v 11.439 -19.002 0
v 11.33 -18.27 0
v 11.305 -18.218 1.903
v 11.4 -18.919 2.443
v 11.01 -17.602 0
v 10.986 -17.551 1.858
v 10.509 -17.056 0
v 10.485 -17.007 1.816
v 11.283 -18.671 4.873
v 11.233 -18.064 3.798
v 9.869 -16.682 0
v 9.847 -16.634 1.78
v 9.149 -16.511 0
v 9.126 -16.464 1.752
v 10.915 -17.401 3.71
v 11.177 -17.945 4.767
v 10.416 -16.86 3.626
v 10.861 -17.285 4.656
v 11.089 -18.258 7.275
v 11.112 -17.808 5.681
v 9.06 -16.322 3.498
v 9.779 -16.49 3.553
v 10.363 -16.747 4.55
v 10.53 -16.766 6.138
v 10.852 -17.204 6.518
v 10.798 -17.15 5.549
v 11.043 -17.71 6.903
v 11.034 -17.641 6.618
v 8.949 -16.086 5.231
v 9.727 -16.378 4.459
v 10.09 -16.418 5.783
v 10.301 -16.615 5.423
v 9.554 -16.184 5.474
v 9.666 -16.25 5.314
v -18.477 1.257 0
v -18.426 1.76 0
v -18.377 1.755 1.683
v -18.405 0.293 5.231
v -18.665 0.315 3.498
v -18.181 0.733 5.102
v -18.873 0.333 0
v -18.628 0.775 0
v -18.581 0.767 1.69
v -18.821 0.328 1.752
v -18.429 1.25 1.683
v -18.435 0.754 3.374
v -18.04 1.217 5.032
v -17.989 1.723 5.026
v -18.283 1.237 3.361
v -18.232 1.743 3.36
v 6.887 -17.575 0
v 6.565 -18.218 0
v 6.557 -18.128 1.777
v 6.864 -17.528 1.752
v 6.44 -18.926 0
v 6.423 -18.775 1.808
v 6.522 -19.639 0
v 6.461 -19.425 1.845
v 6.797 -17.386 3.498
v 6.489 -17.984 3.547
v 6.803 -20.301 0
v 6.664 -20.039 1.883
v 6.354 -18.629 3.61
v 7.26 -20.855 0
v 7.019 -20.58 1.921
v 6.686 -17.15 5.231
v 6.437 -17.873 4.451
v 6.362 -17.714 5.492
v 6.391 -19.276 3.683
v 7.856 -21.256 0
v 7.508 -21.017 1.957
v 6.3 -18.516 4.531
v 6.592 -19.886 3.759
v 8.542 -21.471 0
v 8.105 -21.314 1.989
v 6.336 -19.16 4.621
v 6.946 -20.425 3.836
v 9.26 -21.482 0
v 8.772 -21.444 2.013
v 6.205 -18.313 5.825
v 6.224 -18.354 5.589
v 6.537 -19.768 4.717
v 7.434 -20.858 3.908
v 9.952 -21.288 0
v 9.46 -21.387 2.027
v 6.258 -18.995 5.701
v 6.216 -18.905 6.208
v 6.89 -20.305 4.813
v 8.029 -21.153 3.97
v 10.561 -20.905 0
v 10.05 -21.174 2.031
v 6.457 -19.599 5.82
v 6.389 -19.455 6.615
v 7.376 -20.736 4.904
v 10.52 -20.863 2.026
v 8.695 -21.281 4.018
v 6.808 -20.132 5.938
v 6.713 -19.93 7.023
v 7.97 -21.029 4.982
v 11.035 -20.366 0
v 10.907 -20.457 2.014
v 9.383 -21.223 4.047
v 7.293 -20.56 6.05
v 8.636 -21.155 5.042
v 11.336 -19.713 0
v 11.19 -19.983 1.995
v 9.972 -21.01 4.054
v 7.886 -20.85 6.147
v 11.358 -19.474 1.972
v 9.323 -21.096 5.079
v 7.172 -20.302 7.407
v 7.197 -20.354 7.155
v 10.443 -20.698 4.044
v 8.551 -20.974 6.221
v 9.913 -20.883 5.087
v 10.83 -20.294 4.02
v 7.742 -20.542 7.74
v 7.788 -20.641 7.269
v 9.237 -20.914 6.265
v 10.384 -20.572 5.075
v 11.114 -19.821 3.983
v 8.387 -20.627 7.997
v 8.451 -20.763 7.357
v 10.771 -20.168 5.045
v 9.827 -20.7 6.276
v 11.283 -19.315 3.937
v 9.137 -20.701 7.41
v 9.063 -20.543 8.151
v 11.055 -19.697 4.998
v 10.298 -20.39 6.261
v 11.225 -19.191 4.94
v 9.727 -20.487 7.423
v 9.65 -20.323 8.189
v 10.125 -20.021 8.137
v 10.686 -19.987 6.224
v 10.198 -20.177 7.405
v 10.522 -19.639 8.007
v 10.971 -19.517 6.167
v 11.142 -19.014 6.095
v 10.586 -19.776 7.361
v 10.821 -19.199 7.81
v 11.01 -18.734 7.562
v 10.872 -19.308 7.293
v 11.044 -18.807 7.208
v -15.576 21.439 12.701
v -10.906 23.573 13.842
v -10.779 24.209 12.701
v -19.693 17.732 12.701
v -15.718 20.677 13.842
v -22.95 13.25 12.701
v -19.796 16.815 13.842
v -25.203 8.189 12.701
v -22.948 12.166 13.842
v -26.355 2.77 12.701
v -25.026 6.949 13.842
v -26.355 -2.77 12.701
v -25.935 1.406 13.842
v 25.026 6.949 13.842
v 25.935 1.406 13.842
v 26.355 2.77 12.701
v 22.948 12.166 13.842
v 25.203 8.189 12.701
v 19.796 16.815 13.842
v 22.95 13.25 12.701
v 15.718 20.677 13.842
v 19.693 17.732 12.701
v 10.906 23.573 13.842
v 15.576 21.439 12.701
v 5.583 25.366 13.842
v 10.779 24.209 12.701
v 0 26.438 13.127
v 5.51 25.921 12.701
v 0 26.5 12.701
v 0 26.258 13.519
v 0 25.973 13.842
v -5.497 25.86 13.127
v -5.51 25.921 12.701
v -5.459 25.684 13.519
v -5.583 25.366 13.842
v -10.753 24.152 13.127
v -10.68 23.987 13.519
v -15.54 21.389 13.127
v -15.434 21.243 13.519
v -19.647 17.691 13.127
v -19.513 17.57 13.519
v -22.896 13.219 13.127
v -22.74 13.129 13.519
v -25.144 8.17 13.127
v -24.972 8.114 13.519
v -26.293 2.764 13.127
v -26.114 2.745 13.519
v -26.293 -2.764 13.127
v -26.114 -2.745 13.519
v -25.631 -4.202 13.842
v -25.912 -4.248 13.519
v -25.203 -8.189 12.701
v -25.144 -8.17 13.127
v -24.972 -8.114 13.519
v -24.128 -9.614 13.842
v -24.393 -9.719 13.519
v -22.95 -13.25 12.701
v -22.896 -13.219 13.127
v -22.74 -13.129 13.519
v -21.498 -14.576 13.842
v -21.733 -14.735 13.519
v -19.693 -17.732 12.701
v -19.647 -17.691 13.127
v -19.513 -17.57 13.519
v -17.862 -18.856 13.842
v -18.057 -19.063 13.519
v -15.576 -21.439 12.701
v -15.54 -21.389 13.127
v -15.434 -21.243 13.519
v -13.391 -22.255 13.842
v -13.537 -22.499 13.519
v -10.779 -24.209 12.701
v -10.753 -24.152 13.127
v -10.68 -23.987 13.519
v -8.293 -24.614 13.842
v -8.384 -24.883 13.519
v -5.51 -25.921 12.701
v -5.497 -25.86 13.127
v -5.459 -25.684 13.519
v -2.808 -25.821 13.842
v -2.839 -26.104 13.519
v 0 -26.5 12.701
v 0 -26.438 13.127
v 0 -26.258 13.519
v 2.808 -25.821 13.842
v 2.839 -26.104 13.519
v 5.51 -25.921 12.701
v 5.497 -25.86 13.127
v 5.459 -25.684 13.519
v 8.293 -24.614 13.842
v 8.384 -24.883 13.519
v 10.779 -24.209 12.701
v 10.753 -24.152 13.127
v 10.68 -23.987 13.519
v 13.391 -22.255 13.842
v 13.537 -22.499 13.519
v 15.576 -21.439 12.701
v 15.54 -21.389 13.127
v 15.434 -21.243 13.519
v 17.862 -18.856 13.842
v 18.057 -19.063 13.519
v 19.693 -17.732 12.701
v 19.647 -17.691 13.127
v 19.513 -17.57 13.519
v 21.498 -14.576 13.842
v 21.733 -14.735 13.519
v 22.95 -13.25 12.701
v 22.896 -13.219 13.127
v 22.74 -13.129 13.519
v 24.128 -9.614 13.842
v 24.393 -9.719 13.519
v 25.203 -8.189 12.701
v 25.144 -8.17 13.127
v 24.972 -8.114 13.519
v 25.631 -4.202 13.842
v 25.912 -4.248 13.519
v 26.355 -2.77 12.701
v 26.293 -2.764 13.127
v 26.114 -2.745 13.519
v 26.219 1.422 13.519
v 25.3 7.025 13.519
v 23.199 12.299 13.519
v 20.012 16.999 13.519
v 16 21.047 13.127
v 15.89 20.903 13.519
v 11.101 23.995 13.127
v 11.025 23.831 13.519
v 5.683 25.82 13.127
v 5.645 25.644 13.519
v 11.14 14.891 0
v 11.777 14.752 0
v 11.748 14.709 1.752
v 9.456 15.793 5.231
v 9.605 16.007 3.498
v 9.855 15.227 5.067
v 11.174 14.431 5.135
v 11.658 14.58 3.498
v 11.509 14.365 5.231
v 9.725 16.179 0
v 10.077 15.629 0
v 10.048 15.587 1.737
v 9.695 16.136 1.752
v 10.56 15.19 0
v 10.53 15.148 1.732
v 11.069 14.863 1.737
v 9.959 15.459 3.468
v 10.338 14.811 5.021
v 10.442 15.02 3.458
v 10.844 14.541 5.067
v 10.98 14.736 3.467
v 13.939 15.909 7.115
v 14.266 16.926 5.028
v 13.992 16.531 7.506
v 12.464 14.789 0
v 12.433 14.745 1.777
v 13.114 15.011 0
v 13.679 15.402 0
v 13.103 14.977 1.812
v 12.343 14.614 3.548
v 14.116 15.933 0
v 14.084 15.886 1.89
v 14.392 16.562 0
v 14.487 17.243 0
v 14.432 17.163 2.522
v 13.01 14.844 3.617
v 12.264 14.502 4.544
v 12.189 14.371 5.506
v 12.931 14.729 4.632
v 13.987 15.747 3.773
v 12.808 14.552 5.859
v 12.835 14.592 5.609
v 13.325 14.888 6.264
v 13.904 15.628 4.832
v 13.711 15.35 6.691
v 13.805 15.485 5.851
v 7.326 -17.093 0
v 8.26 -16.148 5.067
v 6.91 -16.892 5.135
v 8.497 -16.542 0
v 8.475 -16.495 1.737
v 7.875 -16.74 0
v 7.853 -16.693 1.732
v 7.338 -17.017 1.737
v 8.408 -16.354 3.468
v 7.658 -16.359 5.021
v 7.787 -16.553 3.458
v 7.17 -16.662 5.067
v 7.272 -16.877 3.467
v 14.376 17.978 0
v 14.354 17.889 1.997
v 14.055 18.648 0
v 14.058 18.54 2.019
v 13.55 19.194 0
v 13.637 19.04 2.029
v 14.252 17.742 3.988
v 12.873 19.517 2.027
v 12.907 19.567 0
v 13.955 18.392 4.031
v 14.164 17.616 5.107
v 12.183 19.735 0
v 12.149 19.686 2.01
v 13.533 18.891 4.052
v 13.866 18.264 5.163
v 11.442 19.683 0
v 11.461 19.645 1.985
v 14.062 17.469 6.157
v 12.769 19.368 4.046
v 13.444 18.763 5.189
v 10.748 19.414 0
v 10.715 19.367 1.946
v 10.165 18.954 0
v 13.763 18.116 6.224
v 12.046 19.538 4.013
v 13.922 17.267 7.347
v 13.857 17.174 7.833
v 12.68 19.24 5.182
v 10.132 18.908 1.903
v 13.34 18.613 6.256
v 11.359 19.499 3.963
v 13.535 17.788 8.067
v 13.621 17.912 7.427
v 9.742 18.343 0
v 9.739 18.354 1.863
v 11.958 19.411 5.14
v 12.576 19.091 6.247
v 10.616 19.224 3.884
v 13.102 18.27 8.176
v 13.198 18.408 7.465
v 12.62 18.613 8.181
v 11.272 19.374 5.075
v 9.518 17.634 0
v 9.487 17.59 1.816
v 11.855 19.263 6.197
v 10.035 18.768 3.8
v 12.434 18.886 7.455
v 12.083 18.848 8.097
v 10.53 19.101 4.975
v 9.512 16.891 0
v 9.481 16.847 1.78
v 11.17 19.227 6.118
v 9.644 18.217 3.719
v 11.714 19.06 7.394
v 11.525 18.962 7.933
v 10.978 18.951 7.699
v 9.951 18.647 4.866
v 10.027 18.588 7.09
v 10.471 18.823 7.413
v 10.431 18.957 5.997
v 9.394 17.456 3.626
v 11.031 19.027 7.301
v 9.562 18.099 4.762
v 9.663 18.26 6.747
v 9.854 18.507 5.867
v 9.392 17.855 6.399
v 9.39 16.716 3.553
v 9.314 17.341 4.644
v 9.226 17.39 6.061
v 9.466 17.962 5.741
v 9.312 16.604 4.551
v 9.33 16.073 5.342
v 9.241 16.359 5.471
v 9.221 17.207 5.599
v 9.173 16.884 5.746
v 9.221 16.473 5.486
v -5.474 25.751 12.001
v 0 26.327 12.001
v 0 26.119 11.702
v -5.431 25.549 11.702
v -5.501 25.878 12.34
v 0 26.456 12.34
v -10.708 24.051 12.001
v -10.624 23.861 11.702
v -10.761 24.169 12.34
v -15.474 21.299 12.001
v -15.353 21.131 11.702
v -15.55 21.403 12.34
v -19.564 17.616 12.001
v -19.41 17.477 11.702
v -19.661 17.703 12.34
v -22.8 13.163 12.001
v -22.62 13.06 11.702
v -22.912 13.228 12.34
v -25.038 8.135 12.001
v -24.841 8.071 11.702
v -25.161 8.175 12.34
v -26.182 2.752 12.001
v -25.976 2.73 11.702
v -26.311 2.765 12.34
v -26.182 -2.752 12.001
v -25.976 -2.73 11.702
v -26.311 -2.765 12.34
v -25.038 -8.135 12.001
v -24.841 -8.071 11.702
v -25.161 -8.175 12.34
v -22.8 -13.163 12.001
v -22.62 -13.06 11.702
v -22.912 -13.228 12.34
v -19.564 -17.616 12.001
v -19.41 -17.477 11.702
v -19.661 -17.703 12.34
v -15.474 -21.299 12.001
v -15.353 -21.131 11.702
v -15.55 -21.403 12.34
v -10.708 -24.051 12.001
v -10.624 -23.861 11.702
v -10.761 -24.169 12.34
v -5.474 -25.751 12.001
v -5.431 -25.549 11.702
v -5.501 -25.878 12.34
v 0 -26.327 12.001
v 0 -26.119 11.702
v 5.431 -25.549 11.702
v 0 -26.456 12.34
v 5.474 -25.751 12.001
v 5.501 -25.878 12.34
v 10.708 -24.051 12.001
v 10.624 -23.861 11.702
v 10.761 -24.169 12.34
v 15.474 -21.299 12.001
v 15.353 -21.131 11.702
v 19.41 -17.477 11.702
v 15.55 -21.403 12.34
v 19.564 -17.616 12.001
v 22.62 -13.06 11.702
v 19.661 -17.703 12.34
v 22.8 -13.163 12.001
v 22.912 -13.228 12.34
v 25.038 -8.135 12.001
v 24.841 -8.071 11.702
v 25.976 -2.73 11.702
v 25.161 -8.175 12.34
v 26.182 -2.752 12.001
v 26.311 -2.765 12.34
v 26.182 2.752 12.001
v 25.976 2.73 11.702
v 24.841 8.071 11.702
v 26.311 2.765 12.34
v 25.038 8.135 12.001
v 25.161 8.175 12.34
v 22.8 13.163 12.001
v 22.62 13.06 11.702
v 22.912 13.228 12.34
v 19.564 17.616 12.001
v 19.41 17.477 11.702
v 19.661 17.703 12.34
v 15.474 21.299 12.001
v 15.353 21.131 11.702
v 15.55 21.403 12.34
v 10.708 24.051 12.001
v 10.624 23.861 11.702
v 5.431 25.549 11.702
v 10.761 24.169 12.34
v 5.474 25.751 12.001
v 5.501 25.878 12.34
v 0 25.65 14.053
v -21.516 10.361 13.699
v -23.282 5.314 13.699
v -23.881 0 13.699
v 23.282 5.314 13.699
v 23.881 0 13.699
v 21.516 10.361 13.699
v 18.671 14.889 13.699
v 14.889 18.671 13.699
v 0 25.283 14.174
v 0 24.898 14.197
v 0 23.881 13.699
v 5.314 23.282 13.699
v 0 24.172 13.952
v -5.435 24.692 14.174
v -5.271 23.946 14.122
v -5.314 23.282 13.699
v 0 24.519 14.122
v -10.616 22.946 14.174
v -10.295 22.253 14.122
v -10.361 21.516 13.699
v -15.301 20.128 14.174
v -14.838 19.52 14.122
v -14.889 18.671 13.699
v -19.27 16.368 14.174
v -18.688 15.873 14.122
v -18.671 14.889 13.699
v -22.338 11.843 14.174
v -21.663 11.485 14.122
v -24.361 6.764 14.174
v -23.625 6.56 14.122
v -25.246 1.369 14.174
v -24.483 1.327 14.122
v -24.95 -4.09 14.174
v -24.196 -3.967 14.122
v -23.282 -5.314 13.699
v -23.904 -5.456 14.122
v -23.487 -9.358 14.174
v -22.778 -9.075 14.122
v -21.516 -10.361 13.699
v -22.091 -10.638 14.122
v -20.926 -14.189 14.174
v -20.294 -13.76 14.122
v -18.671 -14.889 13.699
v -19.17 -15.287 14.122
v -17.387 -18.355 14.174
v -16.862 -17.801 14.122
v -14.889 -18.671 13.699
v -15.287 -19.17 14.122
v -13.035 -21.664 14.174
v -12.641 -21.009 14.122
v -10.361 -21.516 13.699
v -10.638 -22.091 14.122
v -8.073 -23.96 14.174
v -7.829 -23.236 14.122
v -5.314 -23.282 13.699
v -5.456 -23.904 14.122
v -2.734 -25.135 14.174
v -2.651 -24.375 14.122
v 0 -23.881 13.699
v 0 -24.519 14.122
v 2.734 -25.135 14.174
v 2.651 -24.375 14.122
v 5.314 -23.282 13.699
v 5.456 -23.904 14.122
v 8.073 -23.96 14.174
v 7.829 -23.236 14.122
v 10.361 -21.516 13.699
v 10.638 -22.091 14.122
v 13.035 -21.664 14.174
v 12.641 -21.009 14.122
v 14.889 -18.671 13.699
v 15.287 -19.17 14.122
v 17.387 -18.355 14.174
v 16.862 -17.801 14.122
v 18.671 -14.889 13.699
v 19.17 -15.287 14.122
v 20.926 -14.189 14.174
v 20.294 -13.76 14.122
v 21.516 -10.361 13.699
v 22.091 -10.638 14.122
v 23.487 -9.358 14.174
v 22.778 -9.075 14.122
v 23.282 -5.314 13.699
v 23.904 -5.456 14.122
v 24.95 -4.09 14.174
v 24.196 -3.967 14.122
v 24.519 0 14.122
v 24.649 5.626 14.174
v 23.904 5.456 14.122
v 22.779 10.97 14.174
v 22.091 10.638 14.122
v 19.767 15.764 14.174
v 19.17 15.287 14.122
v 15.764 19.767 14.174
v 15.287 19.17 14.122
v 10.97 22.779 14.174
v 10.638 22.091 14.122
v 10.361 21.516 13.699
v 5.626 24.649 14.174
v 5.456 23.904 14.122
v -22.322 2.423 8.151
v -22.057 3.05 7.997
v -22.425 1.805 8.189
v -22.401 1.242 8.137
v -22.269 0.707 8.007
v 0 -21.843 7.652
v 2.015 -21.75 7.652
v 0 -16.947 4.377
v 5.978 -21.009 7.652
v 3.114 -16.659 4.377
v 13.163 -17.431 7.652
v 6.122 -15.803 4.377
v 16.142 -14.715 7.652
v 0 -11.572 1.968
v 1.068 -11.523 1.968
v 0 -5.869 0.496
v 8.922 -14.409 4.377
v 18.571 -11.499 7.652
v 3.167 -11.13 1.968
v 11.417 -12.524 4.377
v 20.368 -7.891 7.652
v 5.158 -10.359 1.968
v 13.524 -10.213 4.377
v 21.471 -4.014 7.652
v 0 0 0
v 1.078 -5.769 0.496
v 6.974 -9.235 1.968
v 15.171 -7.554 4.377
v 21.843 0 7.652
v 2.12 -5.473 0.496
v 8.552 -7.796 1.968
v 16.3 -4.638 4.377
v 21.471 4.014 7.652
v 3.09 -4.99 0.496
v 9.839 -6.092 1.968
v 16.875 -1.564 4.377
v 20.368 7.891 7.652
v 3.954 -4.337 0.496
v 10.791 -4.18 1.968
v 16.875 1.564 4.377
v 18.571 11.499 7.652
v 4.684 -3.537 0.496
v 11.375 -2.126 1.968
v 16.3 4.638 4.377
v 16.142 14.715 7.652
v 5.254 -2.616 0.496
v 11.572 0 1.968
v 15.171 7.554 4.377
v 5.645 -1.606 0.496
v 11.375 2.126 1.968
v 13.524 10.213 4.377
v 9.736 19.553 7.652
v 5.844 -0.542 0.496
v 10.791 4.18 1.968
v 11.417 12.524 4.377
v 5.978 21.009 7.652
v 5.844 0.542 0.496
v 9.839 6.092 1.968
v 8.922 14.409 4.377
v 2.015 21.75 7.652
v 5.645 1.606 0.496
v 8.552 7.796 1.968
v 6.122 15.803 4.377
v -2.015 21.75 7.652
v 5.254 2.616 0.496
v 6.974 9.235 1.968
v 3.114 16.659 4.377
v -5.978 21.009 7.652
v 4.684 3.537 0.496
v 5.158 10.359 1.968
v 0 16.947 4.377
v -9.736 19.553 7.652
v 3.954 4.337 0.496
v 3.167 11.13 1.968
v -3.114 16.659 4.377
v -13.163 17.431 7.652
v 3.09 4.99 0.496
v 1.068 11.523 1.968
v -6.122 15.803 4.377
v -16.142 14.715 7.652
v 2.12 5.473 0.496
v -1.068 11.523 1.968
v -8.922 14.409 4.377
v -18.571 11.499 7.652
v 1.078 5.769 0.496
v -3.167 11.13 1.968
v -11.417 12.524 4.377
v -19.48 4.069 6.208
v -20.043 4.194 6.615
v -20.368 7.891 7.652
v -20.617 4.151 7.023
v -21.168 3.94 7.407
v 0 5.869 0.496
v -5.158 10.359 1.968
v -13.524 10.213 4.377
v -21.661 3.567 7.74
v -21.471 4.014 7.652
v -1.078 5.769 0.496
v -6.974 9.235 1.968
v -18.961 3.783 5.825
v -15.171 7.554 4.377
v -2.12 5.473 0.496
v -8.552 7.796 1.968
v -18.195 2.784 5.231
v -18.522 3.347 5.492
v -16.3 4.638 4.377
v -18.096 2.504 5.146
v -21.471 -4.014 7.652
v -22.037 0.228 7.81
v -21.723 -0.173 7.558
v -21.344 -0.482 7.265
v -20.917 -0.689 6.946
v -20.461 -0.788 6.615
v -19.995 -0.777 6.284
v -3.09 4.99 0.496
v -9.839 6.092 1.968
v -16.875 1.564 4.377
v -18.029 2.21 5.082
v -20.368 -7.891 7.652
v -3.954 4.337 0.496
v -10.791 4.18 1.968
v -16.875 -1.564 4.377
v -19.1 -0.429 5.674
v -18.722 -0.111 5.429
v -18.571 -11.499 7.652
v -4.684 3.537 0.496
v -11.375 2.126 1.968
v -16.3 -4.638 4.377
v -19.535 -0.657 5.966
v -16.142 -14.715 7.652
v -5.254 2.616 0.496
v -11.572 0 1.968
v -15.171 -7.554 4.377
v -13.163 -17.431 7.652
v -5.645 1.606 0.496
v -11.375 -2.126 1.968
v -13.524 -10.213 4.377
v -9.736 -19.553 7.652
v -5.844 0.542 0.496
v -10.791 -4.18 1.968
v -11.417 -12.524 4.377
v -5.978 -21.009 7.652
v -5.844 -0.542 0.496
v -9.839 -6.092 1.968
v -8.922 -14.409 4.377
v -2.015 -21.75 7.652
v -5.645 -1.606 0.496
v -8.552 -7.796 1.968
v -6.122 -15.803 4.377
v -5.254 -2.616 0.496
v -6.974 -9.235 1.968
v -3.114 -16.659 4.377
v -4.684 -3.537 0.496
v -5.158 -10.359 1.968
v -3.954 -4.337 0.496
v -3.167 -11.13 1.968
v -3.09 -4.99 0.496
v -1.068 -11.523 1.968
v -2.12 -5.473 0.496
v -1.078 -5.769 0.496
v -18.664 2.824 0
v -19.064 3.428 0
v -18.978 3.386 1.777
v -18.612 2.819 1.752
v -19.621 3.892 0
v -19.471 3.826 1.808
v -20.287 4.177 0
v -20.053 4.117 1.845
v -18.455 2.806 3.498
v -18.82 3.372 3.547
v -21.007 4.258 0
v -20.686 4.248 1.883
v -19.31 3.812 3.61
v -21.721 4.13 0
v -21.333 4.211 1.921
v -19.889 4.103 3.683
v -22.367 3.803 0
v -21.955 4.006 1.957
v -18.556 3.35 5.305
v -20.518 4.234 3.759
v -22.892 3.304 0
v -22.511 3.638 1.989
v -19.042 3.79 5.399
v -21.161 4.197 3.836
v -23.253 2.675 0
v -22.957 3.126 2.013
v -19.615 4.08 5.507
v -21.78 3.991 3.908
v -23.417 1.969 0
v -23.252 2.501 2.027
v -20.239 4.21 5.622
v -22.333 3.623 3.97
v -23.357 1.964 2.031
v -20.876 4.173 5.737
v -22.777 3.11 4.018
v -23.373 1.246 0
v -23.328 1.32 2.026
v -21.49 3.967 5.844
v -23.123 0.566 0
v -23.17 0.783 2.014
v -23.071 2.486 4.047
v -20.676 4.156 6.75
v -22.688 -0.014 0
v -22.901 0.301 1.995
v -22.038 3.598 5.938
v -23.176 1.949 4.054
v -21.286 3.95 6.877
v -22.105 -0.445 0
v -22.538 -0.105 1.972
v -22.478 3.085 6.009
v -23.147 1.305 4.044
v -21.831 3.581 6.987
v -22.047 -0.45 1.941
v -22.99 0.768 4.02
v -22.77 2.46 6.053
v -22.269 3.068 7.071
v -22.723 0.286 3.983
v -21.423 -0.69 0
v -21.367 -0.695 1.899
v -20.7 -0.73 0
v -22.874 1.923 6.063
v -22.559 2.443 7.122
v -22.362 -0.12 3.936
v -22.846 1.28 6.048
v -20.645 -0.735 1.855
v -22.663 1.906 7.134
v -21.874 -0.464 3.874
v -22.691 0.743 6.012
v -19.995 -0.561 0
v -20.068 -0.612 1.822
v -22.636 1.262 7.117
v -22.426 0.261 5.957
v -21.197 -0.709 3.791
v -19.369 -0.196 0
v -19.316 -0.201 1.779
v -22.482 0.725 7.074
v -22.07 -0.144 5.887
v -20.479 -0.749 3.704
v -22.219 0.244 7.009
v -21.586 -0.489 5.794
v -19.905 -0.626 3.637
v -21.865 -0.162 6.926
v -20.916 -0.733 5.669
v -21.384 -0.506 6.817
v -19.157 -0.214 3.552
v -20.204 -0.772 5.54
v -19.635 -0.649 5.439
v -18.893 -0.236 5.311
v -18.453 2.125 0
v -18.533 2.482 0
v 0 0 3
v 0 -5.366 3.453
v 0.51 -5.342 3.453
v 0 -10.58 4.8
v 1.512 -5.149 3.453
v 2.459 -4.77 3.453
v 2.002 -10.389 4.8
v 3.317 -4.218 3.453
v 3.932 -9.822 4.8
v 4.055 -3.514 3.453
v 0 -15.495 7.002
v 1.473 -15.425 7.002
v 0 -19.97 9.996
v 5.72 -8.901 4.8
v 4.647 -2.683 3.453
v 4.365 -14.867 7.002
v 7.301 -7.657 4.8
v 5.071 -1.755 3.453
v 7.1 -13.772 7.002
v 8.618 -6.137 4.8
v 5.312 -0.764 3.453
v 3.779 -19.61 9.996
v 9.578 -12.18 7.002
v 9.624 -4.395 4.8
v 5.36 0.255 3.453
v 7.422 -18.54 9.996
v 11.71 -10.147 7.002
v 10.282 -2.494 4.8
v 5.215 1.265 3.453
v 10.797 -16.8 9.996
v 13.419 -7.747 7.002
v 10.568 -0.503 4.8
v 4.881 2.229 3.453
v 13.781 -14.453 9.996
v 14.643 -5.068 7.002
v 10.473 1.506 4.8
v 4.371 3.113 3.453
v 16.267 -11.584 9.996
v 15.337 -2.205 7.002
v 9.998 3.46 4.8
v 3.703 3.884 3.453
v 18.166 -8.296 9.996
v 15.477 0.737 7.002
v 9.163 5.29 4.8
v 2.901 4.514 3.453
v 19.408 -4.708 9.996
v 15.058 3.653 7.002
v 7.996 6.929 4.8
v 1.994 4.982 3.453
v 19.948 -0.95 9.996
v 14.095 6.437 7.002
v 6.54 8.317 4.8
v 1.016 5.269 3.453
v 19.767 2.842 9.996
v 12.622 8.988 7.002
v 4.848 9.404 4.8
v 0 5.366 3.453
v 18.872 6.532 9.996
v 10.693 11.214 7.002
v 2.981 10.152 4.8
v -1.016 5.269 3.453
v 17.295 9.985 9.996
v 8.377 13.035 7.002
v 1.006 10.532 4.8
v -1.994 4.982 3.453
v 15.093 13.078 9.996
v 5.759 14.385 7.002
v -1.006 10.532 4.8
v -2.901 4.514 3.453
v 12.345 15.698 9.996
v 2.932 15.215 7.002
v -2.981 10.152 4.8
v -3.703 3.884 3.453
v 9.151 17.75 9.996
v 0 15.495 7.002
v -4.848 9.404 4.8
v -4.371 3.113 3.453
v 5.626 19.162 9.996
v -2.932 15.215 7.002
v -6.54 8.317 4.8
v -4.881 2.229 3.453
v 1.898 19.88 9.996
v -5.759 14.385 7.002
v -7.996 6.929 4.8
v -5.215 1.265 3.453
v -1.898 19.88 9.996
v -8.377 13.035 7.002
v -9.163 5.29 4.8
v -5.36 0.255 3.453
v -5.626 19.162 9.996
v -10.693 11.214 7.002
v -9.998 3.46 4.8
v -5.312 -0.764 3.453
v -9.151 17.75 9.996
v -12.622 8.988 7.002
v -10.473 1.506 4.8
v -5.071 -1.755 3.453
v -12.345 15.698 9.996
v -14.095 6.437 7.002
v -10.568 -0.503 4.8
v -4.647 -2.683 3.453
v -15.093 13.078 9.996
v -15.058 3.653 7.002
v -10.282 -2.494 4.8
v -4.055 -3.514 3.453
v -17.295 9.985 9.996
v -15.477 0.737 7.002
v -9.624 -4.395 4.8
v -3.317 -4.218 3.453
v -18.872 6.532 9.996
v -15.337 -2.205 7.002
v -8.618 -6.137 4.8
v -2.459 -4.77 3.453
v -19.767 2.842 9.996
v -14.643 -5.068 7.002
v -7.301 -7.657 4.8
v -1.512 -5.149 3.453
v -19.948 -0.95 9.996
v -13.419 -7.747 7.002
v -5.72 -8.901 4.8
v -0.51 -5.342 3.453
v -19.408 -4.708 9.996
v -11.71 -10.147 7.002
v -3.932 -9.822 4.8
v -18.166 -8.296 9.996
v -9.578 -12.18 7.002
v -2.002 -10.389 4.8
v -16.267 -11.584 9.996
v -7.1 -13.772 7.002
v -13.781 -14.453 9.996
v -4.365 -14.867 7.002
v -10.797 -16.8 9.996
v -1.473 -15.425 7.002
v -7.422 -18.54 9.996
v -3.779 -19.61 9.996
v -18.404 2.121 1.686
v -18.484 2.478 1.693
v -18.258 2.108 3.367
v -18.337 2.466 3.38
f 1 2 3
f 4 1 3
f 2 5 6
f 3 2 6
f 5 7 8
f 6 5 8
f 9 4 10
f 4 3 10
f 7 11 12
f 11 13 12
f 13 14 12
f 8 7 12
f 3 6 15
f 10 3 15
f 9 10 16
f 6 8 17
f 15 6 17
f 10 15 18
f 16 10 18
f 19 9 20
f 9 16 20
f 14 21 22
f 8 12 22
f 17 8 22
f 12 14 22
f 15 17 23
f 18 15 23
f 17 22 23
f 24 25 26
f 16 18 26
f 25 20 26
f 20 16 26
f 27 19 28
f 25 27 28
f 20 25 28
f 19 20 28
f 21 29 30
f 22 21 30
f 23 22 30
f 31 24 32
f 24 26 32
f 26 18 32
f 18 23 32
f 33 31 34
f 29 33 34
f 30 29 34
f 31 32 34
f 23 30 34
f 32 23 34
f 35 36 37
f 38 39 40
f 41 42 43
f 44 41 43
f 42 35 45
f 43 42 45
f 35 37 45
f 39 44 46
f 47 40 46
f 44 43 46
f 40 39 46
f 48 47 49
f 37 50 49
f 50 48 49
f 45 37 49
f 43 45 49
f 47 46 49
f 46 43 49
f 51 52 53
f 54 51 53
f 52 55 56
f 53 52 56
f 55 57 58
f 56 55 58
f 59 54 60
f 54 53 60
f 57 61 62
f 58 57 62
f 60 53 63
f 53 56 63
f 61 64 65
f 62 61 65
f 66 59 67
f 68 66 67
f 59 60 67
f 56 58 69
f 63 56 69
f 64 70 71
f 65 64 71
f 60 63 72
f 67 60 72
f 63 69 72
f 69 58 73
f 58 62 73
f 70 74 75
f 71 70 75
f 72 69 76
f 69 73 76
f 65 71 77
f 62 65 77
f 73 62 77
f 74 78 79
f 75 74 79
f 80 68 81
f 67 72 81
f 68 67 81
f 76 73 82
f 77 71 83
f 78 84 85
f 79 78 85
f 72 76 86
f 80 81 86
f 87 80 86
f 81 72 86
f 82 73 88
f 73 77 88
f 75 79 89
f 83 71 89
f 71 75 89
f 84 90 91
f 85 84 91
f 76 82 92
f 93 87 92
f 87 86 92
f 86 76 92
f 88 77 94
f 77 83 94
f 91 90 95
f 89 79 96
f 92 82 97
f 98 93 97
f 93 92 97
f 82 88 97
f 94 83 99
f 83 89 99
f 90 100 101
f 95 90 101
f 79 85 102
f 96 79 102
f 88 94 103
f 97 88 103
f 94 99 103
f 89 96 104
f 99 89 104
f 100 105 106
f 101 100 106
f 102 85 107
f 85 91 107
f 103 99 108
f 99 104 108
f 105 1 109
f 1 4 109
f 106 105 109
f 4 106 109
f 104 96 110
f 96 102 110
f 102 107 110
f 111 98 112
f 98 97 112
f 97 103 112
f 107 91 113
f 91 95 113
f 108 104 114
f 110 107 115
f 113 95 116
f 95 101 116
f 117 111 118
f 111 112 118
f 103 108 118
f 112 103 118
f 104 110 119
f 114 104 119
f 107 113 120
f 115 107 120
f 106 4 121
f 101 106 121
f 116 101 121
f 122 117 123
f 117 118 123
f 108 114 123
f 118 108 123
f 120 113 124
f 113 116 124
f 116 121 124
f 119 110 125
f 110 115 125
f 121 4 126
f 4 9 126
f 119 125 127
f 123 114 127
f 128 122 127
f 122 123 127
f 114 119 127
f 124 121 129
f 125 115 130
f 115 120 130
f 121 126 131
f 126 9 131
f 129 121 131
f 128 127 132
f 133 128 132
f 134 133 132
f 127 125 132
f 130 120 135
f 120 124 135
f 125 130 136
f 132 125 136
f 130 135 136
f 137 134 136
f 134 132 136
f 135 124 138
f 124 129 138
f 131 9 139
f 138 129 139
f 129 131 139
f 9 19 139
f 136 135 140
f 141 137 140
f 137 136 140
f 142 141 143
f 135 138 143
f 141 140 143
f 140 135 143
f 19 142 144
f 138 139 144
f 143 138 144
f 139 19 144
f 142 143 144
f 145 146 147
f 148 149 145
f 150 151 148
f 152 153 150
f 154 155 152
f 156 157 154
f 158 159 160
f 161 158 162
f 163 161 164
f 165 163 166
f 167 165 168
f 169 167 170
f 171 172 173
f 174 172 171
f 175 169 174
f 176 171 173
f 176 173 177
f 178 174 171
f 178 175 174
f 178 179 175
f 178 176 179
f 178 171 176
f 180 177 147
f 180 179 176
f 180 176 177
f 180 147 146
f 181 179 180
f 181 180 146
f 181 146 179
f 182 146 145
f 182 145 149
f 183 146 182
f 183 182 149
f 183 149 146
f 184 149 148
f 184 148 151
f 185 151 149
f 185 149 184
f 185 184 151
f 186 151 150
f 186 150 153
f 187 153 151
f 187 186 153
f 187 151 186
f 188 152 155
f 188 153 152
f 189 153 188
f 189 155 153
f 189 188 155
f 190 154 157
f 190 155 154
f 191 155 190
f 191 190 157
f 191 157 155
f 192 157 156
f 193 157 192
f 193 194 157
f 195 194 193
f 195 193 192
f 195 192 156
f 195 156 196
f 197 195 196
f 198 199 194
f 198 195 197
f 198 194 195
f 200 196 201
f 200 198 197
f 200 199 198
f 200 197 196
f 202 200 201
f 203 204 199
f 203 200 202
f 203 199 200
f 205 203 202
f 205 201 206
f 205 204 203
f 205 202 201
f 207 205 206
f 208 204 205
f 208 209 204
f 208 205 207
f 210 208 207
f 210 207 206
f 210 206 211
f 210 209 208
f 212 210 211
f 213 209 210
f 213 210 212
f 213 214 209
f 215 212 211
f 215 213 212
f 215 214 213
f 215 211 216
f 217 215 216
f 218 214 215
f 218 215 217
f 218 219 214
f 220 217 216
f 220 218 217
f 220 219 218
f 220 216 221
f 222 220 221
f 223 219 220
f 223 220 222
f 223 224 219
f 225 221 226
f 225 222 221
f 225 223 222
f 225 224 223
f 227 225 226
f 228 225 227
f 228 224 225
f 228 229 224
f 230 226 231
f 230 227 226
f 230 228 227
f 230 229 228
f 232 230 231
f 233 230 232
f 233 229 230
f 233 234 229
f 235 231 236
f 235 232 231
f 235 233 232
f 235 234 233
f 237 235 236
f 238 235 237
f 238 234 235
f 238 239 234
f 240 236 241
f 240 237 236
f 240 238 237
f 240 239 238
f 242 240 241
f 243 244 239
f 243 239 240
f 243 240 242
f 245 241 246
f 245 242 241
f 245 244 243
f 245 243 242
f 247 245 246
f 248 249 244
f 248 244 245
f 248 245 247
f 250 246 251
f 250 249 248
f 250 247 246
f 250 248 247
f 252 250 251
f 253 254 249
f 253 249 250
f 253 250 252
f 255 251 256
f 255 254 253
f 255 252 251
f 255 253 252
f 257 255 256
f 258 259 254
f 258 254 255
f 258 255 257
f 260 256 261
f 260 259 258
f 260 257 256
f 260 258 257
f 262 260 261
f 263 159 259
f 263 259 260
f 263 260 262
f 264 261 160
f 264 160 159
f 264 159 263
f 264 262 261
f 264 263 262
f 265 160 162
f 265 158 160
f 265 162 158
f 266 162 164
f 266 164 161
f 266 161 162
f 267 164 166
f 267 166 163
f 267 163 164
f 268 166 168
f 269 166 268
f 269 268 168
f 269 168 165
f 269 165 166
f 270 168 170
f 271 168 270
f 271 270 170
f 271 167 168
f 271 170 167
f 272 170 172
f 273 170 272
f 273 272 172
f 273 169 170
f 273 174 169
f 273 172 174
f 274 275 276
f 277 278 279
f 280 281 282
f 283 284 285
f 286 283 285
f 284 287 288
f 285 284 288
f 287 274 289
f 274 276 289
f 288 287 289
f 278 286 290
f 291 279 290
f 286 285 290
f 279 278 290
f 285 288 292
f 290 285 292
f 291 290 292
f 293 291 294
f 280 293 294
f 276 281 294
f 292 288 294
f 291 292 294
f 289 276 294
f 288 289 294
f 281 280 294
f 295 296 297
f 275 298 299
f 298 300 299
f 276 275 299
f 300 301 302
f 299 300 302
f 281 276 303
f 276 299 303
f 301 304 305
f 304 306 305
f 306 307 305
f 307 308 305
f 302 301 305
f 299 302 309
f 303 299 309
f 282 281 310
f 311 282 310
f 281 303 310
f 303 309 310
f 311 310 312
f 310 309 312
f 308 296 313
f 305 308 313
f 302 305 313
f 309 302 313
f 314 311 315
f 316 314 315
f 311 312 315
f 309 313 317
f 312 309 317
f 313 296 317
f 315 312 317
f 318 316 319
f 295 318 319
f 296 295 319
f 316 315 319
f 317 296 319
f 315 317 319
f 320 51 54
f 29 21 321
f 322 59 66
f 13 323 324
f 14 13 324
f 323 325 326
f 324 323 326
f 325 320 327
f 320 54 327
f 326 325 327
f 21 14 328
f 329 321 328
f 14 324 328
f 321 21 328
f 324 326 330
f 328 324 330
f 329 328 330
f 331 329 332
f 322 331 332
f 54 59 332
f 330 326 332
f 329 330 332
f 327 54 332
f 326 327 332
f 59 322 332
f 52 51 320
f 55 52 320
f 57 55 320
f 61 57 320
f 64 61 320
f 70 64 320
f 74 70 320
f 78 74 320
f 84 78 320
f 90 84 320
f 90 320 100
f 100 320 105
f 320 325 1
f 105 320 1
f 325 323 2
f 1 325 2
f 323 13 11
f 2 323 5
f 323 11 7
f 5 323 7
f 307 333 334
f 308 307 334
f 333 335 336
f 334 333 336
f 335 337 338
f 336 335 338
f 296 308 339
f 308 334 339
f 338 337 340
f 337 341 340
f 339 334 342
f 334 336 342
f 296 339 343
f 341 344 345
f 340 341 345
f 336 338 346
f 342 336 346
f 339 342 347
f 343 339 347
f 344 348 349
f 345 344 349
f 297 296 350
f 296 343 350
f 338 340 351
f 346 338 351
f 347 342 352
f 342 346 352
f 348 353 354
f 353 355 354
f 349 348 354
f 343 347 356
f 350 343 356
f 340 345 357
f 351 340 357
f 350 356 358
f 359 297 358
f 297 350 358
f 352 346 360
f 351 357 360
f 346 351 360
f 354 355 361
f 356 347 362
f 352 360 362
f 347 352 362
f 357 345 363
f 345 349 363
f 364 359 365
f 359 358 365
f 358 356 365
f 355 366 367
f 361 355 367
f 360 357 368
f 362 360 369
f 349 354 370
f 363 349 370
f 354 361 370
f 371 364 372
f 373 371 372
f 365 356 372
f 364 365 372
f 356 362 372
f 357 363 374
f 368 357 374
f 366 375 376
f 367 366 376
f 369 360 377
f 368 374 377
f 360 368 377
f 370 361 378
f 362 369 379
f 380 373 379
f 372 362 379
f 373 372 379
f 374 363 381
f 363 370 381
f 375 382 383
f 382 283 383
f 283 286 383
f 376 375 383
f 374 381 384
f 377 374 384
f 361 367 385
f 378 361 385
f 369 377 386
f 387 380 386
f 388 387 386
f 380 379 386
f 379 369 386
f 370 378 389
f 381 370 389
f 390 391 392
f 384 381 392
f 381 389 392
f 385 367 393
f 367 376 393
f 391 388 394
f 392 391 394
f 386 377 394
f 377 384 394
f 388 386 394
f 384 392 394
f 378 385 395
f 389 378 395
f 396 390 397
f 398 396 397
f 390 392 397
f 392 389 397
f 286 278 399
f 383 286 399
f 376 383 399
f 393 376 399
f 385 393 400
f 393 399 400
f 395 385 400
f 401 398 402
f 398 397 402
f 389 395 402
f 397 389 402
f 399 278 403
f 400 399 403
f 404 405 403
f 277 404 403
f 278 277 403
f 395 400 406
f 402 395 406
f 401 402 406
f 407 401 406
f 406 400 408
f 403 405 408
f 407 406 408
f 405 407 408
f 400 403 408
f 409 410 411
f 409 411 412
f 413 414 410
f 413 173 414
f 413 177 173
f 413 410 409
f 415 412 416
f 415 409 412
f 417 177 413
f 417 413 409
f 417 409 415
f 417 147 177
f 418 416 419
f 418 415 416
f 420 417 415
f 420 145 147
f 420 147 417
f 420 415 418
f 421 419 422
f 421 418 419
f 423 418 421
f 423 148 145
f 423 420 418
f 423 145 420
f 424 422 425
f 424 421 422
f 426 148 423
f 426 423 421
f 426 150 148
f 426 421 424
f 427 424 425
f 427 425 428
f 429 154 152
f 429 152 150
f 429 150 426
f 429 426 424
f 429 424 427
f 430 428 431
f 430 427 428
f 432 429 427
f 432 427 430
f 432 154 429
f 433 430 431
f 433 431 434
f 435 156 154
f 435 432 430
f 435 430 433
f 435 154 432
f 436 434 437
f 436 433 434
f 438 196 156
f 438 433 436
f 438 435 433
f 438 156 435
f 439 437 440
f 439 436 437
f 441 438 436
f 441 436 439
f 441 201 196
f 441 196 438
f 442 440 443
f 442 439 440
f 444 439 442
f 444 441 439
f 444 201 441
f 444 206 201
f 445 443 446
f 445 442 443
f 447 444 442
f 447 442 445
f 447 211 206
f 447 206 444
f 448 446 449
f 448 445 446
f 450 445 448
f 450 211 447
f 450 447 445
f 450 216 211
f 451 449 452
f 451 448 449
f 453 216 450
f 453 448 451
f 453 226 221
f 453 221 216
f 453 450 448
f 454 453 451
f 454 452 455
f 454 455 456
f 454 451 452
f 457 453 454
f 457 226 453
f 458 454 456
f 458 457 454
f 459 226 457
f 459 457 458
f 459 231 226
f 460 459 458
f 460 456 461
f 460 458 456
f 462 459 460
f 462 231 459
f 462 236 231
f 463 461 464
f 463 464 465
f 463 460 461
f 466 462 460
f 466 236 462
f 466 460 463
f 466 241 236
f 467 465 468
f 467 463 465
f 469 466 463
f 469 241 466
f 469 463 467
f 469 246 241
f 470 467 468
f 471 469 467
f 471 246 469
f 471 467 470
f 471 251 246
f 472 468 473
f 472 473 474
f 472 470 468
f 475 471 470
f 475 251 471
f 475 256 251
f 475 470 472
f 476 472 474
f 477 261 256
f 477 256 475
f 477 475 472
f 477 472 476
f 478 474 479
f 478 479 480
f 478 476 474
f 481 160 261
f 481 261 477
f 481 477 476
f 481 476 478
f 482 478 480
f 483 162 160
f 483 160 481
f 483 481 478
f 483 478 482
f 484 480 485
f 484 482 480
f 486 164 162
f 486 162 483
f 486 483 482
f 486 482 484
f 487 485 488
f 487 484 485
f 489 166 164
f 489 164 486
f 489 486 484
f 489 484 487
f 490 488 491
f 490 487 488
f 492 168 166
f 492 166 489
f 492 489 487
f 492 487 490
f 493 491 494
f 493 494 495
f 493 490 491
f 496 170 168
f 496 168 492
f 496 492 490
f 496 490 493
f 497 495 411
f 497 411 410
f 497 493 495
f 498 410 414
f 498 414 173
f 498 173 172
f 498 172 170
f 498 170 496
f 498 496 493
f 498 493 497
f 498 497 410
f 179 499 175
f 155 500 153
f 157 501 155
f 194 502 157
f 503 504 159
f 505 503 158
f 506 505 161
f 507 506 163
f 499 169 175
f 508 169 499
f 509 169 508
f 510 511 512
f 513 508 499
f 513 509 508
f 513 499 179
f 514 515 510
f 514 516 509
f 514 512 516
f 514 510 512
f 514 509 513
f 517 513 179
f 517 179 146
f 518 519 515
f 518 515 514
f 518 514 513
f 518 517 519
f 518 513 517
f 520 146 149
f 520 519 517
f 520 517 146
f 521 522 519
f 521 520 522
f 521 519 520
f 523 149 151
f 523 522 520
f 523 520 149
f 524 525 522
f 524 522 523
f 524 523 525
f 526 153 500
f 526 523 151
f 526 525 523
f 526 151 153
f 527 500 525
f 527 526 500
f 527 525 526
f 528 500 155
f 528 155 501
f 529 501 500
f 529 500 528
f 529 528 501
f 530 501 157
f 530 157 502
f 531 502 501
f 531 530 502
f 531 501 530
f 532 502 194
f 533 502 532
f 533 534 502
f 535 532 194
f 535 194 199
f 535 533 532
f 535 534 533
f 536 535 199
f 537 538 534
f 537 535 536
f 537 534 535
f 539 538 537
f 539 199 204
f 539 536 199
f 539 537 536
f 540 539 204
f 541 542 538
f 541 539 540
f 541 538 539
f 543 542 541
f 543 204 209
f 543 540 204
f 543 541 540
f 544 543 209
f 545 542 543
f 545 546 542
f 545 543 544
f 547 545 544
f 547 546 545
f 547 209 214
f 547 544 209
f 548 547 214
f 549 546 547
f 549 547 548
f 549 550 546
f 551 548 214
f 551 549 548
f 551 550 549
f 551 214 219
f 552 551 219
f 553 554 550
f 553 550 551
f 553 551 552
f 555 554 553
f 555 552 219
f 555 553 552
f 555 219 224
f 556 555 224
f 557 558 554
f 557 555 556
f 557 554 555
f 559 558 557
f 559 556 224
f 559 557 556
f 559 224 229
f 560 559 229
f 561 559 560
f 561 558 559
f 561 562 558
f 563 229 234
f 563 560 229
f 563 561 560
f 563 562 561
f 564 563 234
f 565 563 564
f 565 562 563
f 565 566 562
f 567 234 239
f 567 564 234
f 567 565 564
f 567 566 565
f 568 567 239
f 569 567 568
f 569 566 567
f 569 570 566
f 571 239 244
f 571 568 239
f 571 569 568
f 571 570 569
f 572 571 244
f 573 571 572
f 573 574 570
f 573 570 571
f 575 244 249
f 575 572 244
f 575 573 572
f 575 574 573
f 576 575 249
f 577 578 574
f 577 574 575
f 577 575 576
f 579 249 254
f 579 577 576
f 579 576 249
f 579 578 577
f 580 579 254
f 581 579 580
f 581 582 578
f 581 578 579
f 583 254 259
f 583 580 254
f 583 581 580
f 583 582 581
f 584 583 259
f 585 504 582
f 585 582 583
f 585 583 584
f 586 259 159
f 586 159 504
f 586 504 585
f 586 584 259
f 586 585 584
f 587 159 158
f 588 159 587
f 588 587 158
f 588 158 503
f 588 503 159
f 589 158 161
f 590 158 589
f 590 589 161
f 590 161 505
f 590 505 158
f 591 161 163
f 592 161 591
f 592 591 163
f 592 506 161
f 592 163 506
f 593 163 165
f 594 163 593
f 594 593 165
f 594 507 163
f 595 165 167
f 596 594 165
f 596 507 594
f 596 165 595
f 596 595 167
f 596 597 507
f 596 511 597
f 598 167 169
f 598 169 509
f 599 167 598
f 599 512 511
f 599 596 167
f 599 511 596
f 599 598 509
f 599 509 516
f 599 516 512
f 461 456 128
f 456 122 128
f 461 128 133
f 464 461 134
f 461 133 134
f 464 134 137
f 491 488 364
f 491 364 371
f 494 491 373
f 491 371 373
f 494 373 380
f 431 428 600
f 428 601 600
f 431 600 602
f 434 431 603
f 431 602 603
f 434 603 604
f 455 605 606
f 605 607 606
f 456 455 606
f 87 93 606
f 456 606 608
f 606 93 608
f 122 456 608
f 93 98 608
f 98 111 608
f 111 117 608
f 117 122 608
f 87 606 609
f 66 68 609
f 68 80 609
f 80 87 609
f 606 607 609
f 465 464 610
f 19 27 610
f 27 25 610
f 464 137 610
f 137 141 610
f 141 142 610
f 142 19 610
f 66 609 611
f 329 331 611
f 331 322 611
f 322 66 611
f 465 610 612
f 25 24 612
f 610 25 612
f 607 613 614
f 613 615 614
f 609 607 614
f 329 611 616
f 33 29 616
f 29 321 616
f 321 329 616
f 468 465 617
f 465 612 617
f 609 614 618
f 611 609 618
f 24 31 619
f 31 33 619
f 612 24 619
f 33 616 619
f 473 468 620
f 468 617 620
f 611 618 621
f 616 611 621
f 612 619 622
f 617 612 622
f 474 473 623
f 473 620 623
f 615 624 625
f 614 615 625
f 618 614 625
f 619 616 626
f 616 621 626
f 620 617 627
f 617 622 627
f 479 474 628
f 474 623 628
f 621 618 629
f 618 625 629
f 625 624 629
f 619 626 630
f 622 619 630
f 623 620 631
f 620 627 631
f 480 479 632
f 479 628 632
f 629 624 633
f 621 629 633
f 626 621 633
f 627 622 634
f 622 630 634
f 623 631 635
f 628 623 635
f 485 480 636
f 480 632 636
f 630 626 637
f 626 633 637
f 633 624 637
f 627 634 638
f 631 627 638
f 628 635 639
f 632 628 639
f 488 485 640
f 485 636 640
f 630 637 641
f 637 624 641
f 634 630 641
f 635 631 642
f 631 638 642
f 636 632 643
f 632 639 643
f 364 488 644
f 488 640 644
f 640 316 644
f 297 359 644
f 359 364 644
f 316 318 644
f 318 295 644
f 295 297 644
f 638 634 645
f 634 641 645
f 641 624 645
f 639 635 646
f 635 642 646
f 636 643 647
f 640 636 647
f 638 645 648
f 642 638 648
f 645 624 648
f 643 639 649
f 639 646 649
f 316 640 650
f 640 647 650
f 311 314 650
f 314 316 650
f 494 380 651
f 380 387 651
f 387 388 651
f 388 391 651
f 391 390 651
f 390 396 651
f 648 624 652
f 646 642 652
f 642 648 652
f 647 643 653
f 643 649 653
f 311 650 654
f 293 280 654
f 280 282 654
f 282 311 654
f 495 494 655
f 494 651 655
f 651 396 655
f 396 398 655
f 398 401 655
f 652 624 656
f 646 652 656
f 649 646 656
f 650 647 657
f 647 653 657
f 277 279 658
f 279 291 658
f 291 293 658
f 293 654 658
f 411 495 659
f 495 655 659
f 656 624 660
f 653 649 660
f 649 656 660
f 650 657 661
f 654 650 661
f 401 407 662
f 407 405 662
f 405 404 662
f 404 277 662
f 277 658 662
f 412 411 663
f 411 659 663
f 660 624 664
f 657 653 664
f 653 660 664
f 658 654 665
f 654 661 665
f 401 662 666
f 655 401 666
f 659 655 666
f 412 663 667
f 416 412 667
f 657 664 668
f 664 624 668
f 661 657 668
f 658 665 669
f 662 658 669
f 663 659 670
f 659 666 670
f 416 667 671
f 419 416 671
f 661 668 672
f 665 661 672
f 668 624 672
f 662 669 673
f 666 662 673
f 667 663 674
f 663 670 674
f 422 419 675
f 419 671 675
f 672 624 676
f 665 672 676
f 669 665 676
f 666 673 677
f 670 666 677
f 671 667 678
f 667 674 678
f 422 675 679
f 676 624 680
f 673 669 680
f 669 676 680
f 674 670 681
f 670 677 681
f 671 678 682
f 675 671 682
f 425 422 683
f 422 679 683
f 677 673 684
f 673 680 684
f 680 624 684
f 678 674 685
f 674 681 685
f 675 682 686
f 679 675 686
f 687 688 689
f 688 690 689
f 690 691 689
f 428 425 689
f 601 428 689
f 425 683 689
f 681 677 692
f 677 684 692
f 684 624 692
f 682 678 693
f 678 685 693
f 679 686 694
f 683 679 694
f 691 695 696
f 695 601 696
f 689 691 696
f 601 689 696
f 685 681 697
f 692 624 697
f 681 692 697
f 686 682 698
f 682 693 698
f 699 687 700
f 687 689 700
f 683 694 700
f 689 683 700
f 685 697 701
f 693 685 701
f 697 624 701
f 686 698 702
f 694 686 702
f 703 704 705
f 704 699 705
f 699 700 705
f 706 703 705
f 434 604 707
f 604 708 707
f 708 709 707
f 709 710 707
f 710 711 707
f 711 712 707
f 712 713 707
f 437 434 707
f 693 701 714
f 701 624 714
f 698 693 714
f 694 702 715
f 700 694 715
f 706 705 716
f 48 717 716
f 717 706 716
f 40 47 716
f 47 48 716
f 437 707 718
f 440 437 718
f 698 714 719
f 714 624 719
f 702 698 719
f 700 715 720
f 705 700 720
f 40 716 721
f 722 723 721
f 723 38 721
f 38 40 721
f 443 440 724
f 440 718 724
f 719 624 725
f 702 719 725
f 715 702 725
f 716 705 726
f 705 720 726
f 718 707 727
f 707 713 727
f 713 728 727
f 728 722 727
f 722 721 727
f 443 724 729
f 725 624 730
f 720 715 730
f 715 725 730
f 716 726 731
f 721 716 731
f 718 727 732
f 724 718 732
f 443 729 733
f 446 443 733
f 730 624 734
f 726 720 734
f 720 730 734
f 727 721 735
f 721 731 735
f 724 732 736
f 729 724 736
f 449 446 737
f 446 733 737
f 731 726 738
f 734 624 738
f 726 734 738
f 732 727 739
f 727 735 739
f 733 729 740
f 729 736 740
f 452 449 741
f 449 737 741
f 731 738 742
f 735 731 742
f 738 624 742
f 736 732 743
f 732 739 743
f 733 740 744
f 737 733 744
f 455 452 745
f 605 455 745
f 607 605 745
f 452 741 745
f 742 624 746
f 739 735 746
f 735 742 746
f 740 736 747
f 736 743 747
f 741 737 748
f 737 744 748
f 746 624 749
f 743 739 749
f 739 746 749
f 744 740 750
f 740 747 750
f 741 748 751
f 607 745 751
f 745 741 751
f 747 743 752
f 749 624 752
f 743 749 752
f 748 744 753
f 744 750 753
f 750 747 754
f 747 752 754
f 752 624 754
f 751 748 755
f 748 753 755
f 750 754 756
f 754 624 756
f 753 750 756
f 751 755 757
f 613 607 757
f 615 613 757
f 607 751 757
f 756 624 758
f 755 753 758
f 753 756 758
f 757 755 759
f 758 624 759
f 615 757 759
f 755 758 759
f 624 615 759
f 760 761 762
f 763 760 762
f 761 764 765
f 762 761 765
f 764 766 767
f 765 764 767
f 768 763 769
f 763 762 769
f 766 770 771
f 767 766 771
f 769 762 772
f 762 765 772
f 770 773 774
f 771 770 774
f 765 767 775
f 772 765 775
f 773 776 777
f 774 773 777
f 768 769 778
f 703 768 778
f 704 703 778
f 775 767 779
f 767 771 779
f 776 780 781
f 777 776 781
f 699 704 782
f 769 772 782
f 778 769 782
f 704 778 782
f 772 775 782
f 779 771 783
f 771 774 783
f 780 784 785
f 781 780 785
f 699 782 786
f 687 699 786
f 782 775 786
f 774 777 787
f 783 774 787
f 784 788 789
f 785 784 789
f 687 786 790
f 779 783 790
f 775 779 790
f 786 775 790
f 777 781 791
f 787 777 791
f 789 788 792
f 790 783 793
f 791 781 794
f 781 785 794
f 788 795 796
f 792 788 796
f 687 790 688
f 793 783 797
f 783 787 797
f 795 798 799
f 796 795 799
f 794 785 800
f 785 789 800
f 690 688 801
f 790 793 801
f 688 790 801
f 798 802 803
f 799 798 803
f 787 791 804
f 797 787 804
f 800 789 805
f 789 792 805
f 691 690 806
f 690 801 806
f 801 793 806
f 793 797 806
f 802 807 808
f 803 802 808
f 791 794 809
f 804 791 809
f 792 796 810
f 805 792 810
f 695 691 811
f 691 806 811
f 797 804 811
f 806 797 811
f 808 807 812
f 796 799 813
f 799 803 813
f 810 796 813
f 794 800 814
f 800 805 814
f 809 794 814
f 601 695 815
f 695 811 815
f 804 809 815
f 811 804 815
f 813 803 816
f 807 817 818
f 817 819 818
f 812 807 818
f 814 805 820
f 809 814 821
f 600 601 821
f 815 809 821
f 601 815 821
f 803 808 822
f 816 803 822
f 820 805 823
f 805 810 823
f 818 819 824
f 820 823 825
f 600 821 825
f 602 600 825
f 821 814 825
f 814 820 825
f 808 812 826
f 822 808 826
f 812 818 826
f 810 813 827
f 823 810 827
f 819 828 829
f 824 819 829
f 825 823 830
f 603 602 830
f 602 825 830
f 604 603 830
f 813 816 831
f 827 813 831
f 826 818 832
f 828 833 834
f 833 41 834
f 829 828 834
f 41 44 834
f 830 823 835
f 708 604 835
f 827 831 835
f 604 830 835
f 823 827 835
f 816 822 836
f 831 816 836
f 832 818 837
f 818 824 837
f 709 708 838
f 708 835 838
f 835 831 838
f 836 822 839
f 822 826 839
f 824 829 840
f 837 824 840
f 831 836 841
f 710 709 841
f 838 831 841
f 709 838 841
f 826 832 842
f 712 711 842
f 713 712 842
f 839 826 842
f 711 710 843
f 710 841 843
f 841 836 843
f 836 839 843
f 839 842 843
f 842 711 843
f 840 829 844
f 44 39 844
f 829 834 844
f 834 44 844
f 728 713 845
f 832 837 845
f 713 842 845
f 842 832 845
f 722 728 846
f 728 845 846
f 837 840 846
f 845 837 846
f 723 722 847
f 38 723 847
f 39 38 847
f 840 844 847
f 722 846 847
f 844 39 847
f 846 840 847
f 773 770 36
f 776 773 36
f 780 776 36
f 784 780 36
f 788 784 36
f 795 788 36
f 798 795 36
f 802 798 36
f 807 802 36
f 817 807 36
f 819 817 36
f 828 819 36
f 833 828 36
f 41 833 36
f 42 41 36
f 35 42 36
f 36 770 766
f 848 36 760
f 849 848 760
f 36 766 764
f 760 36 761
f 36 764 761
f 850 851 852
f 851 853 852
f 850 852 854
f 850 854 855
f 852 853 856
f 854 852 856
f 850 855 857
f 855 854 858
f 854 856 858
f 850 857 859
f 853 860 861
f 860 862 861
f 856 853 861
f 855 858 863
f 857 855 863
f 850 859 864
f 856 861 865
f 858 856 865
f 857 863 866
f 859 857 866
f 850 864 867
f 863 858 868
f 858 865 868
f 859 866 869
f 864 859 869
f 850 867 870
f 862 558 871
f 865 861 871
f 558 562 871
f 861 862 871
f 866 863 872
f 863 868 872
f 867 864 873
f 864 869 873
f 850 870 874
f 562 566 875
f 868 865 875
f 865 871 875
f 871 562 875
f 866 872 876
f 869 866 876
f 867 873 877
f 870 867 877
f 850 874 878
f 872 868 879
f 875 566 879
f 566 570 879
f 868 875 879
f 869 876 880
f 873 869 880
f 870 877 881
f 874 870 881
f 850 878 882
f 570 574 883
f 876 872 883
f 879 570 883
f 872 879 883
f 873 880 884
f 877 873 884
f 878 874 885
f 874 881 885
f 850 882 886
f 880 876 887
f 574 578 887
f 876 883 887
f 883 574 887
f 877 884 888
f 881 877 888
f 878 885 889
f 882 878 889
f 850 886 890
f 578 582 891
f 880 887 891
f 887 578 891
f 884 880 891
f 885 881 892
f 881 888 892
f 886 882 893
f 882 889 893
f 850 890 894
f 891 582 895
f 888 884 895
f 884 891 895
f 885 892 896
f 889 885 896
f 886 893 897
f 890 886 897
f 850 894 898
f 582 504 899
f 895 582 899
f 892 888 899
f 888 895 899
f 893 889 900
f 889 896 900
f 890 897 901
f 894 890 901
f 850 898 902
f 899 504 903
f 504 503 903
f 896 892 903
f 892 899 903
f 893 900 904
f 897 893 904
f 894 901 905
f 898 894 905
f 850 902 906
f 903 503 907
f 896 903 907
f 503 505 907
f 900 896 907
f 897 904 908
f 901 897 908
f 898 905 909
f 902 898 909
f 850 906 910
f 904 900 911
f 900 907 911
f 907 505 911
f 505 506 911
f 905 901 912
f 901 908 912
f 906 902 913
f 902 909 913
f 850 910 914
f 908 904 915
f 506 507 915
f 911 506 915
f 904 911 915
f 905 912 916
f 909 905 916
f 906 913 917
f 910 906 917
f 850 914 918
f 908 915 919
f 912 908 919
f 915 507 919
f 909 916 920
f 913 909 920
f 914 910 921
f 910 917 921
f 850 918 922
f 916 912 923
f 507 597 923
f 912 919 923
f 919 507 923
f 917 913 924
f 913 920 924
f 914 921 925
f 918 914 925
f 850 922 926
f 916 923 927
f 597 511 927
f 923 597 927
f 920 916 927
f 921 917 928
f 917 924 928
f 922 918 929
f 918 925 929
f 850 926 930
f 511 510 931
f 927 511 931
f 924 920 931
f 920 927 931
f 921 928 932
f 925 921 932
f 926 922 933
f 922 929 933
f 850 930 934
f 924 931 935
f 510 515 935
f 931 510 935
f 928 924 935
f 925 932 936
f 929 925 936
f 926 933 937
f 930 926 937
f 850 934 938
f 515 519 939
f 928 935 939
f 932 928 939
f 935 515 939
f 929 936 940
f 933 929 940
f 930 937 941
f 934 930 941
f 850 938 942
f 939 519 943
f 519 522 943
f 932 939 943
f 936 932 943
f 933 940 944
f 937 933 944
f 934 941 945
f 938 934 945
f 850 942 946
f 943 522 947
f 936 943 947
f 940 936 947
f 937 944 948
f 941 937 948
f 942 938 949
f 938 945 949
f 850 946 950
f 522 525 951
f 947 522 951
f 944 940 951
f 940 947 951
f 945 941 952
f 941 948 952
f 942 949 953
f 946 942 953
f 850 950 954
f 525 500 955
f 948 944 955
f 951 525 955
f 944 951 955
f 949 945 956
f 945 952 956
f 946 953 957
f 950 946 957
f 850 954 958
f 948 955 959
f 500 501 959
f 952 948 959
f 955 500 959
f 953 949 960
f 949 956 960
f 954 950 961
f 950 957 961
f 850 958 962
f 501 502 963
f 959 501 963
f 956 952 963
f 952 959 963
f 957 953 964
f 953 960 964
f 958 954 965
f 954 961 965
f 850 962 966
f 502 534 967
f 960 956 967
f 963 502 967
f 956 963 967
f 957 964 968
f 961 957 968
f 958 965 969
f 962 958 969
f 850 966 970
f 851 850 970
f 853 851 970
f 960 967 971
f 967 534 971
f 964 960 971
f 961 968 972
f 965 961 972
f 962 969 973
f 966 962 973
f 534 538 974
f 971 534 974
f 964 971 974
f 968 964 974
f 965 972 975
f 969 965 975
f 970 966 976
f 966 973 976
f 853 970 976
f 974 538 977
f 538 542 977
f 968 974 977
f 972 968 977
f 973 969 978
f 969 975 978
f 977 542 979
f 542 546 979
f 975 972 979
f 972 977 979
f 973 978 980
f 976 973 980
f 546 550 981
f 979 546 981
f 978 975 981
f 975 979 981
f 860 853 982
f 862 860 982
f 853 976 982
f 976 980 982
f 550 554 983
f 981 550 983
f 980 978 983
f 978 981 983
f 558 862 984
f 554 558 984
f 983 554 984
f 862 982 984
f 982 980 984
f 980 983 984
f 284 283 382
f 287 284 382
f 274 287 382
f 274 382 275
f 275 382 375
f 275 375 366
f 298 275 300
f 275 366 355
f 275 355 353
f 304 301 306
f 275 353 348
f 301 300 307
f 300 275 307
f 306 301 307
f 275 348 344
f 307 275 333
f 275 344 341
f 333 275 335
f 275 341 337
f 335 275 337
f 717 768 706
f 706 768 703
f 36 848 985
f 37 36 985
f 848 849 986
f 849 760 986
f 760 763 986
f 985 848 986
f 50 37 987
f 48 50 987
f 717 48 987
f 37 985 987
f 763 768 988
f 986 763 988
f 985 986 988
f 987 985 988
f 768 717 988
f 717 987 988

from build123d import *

# Parameters (mm, degrees)
F3_ANGLE = 15
F4_ANGLE = 15
F5_ANGLE = 15


with BuildPart() as f2:
    # F1 (on Right) → F2 (revolve)
    with BuildSketch(Plane.YZ):
        with BuildLine():
            ThreePointArc((-23.5, 12.700896879), (-23.6243333512, 12.1029493301), (-23.9767216951, 11.6041282112))
            ThreePointArc((-23.9767216951, 11.6041282112), (-13.0093869009, 4.1292071294), (0, 1.5))
            Line((0, 1.5), (0, 3))
            ThreePointArc((0, 3), (-13.0839530364, 5.7970862251), (-23.8805970223, 13.6993641912))
            ThreePointArc((-23.8805970223, 13.6993641912), (-23.5983751453, 13.235169999), (-23.5, 12.700896879))
        make_face()
        with BuildLine():
            ThreePointArc((-23.9767216951, 11.6041282112), (-25.0687443502, 11.2024729689), (-26.119403059, 11.7024296579))
            ThreePointArc((-26.119403059, 11.7024296579), (-14.3105736787, 3.059313079), (0, 0))
            Line((0, 0), (0, 1.5))
            ThreePointArc((0, 1.5), (-13.0093869009, 4.1292071294), (-23.9767216951, 11.6041282112))
        make_face()
        with BuildLine():
            ThreePointArc((-25.9731557832, 13.842373038), (-26.4965092865, 12.8031708029), (-26.119403059, 11.7024296579))
            ThreePointArc((-26.119403059, 11.7024296579), (-25.0687443502, 11.2024729689), (-23.9767216951, 11.6041282112))
            ThreePointArc((-23.9767216951, 11.6041282112), (-25, 12.700896879), (-25.9731557832, 13.842373038))
        make_face()
        with BuildLine():
            ThreePointArc((-23.8805970223, 13.6993641912), (-24.897726137, 14.1974061697), (-25.9731557832, 13.842373038))
            ThreePointArc((-25.9731557832, 13.842373038), (-25, 12.700896879), (-23.9767216951, 11.6041282112))
            ThreePointArc((-23.9767216951, 11.6041282112), (-23.6243333512, 12.1029493301), (-23.5, 12.700896879))
            ThreePointArc((-23.5, 12.700896879), (-23.5983751453, 13.235169999), (-23.8805970223, 13.6993641912))
        make_face()
        with BuildLine():
            ThreePointArc((23.9767216951, 11.6041282112), (25.0687443844, 11.2024729705), (26.1194031045, 11.702429709))
            ThreePointArc((26.1194031045, 11.702429709), (26.4016248886, 12.166623848), (26.5, 12.700896879))
            ThreePointArc((26.5, 12.700896879), (26.3619349608, 13.3294930631), (25.9731557832, 13.842373038))
            ThreePointArc((25.9731557832, 13.842373038), (25, 12.700896879), (23.9767216951, 11.6041282112))
        make_face()
        with BuildLine():
            ThreePointArc((23.8805969652, 13.6993641272), (23.5015760891, 12.6321525469), (23.9767216951, 11.6041282112))
            ThreePointArc((23.9767216951, 11.6041282112), (25, 12.700896879), (25.9731557832, 13.842373038))
            ThreePointArc((25.9731557832, 13.842373038), (24.8977260943, 14.1974061667), (23.8805969652, 13.6993641272))
        make_face()
    revolve(axis=Axis((0, 0, 69.2957118154), (0, 0, 1)))

    # F0 (on Top) → F3 (revolve)
    with BuildSketch(Plane.XY):
        with BuildLine():
            ThreePointArc((11.4392372684, -19.0023692486), (10.7795747302, -17.3102823634), (9.1487108469, -16.5111605419))
            Line((9.1487108469, -16.5111605419), (8.9392372684, -19.0023692486))
            Line((8.9392372684, -19.0023692486), (6.8865240316, -17.5753554549))
            ThreePointArc((6.8865240316, -17.5753554549), (8.1915017176, -21.3879282074), (11.4392372684, -19.0023692486))
        make_face()
        with BuildLine():
            Line((8.9392372684, -19.0023692486), (9.1487108469, -16.5111605419))
            ThreePointArc((9.1487108469, -16.5111605419), (7.8750423555, -16.7401824333), (6.8865240316, -17.5753554549))
            Line((6.8865240316, -17.5753554549), (8.9392372684, -19.0023692486))
        make_face()
    revolve(axis=Axis((-4.4696186342, 9.5011846243, 0), (-0.9048747261, -0.4256779652, 0)), revolution_arc=F3_ANGLE)

    # F0 (on Top) → F4 (revolve)
    with BuildSketch(Plane.XY):
        with BuildLine():
            Line((11.7774422886, 14.7515824826), (11.9869158671, 17.2427911892))
            Line((11.9869158671, 17.2427911892), (9.7247290518, 16.1785962763))
            ThreePointArc((9.7247290518, 16.1785962763), (10.5599020734, 15.1900779524), (11.7774422886, 14.7515824826))
        make_face()
        with BuildLine():
            Line((9.7247290518, 16.1785962763), (11.9869158671, 17.2427911892))
            Line((11.9869158671, 17.2427911892), (11.7774422886, 14.7515824826))
            ThreePointArc((11.7774422886, 14.7515824826), (13.6790027523, 15.4024537275), (14.4869158671, 17.2427911892))
            ThreePointArc((14.4869158671, 17.2427911892), (11.4416943701, 19.6826136252), (9.7247290518, 16.1785962763))
        make_face()
    revolve(axis=Axis((-5.9934579336, -8.6213955946, 0), (0.8210852947, -0.5708055175, 0)), revolution_arc=F4_ANGLE)

    # F0 (on Top) → F5 (revolve)
    with BuildSketch(Plane.XY):
        with BuildLine():
            ThreePointArc((-18.4261531356, 1.7595780594), (-18.4863306996, 2.3047995564), (-18.6639663203, 2.8237729723))
            Line((-18.6639663203, 2.8237729723), (-20.9261531356, 1.7595780594))
            Line((-20.9261531356, 1.7595780594), (-18.8734398988, 0.3325642656))
            ThreePointArc((-18.8734398988, 0.3325642656), (-18.5405941767, 1.0118425085), (-18.4261531356, 1.7595780594))
        make_face()
        with BuildLine():
            Line((-20.9261531356, 1.7595780594), (-18.6639663203, 2.8237729723))
            ThreePointArc((-18.6639663203, 2.8237729723), (-23.4173618422, 1.9690516378), (-18.8734398988, 0.3325642656))
            Line((-18.8734398988, 0.3325642656), (-20.9261531356, 1.7595780594))
        make_face()
    revolve(axis=Axis((10.4630765678, -0.8797890297, 0), (0.0837894314, 0.9964834826, 0)), revolution_arc=F5_ANGLE)


solid = f2.part
